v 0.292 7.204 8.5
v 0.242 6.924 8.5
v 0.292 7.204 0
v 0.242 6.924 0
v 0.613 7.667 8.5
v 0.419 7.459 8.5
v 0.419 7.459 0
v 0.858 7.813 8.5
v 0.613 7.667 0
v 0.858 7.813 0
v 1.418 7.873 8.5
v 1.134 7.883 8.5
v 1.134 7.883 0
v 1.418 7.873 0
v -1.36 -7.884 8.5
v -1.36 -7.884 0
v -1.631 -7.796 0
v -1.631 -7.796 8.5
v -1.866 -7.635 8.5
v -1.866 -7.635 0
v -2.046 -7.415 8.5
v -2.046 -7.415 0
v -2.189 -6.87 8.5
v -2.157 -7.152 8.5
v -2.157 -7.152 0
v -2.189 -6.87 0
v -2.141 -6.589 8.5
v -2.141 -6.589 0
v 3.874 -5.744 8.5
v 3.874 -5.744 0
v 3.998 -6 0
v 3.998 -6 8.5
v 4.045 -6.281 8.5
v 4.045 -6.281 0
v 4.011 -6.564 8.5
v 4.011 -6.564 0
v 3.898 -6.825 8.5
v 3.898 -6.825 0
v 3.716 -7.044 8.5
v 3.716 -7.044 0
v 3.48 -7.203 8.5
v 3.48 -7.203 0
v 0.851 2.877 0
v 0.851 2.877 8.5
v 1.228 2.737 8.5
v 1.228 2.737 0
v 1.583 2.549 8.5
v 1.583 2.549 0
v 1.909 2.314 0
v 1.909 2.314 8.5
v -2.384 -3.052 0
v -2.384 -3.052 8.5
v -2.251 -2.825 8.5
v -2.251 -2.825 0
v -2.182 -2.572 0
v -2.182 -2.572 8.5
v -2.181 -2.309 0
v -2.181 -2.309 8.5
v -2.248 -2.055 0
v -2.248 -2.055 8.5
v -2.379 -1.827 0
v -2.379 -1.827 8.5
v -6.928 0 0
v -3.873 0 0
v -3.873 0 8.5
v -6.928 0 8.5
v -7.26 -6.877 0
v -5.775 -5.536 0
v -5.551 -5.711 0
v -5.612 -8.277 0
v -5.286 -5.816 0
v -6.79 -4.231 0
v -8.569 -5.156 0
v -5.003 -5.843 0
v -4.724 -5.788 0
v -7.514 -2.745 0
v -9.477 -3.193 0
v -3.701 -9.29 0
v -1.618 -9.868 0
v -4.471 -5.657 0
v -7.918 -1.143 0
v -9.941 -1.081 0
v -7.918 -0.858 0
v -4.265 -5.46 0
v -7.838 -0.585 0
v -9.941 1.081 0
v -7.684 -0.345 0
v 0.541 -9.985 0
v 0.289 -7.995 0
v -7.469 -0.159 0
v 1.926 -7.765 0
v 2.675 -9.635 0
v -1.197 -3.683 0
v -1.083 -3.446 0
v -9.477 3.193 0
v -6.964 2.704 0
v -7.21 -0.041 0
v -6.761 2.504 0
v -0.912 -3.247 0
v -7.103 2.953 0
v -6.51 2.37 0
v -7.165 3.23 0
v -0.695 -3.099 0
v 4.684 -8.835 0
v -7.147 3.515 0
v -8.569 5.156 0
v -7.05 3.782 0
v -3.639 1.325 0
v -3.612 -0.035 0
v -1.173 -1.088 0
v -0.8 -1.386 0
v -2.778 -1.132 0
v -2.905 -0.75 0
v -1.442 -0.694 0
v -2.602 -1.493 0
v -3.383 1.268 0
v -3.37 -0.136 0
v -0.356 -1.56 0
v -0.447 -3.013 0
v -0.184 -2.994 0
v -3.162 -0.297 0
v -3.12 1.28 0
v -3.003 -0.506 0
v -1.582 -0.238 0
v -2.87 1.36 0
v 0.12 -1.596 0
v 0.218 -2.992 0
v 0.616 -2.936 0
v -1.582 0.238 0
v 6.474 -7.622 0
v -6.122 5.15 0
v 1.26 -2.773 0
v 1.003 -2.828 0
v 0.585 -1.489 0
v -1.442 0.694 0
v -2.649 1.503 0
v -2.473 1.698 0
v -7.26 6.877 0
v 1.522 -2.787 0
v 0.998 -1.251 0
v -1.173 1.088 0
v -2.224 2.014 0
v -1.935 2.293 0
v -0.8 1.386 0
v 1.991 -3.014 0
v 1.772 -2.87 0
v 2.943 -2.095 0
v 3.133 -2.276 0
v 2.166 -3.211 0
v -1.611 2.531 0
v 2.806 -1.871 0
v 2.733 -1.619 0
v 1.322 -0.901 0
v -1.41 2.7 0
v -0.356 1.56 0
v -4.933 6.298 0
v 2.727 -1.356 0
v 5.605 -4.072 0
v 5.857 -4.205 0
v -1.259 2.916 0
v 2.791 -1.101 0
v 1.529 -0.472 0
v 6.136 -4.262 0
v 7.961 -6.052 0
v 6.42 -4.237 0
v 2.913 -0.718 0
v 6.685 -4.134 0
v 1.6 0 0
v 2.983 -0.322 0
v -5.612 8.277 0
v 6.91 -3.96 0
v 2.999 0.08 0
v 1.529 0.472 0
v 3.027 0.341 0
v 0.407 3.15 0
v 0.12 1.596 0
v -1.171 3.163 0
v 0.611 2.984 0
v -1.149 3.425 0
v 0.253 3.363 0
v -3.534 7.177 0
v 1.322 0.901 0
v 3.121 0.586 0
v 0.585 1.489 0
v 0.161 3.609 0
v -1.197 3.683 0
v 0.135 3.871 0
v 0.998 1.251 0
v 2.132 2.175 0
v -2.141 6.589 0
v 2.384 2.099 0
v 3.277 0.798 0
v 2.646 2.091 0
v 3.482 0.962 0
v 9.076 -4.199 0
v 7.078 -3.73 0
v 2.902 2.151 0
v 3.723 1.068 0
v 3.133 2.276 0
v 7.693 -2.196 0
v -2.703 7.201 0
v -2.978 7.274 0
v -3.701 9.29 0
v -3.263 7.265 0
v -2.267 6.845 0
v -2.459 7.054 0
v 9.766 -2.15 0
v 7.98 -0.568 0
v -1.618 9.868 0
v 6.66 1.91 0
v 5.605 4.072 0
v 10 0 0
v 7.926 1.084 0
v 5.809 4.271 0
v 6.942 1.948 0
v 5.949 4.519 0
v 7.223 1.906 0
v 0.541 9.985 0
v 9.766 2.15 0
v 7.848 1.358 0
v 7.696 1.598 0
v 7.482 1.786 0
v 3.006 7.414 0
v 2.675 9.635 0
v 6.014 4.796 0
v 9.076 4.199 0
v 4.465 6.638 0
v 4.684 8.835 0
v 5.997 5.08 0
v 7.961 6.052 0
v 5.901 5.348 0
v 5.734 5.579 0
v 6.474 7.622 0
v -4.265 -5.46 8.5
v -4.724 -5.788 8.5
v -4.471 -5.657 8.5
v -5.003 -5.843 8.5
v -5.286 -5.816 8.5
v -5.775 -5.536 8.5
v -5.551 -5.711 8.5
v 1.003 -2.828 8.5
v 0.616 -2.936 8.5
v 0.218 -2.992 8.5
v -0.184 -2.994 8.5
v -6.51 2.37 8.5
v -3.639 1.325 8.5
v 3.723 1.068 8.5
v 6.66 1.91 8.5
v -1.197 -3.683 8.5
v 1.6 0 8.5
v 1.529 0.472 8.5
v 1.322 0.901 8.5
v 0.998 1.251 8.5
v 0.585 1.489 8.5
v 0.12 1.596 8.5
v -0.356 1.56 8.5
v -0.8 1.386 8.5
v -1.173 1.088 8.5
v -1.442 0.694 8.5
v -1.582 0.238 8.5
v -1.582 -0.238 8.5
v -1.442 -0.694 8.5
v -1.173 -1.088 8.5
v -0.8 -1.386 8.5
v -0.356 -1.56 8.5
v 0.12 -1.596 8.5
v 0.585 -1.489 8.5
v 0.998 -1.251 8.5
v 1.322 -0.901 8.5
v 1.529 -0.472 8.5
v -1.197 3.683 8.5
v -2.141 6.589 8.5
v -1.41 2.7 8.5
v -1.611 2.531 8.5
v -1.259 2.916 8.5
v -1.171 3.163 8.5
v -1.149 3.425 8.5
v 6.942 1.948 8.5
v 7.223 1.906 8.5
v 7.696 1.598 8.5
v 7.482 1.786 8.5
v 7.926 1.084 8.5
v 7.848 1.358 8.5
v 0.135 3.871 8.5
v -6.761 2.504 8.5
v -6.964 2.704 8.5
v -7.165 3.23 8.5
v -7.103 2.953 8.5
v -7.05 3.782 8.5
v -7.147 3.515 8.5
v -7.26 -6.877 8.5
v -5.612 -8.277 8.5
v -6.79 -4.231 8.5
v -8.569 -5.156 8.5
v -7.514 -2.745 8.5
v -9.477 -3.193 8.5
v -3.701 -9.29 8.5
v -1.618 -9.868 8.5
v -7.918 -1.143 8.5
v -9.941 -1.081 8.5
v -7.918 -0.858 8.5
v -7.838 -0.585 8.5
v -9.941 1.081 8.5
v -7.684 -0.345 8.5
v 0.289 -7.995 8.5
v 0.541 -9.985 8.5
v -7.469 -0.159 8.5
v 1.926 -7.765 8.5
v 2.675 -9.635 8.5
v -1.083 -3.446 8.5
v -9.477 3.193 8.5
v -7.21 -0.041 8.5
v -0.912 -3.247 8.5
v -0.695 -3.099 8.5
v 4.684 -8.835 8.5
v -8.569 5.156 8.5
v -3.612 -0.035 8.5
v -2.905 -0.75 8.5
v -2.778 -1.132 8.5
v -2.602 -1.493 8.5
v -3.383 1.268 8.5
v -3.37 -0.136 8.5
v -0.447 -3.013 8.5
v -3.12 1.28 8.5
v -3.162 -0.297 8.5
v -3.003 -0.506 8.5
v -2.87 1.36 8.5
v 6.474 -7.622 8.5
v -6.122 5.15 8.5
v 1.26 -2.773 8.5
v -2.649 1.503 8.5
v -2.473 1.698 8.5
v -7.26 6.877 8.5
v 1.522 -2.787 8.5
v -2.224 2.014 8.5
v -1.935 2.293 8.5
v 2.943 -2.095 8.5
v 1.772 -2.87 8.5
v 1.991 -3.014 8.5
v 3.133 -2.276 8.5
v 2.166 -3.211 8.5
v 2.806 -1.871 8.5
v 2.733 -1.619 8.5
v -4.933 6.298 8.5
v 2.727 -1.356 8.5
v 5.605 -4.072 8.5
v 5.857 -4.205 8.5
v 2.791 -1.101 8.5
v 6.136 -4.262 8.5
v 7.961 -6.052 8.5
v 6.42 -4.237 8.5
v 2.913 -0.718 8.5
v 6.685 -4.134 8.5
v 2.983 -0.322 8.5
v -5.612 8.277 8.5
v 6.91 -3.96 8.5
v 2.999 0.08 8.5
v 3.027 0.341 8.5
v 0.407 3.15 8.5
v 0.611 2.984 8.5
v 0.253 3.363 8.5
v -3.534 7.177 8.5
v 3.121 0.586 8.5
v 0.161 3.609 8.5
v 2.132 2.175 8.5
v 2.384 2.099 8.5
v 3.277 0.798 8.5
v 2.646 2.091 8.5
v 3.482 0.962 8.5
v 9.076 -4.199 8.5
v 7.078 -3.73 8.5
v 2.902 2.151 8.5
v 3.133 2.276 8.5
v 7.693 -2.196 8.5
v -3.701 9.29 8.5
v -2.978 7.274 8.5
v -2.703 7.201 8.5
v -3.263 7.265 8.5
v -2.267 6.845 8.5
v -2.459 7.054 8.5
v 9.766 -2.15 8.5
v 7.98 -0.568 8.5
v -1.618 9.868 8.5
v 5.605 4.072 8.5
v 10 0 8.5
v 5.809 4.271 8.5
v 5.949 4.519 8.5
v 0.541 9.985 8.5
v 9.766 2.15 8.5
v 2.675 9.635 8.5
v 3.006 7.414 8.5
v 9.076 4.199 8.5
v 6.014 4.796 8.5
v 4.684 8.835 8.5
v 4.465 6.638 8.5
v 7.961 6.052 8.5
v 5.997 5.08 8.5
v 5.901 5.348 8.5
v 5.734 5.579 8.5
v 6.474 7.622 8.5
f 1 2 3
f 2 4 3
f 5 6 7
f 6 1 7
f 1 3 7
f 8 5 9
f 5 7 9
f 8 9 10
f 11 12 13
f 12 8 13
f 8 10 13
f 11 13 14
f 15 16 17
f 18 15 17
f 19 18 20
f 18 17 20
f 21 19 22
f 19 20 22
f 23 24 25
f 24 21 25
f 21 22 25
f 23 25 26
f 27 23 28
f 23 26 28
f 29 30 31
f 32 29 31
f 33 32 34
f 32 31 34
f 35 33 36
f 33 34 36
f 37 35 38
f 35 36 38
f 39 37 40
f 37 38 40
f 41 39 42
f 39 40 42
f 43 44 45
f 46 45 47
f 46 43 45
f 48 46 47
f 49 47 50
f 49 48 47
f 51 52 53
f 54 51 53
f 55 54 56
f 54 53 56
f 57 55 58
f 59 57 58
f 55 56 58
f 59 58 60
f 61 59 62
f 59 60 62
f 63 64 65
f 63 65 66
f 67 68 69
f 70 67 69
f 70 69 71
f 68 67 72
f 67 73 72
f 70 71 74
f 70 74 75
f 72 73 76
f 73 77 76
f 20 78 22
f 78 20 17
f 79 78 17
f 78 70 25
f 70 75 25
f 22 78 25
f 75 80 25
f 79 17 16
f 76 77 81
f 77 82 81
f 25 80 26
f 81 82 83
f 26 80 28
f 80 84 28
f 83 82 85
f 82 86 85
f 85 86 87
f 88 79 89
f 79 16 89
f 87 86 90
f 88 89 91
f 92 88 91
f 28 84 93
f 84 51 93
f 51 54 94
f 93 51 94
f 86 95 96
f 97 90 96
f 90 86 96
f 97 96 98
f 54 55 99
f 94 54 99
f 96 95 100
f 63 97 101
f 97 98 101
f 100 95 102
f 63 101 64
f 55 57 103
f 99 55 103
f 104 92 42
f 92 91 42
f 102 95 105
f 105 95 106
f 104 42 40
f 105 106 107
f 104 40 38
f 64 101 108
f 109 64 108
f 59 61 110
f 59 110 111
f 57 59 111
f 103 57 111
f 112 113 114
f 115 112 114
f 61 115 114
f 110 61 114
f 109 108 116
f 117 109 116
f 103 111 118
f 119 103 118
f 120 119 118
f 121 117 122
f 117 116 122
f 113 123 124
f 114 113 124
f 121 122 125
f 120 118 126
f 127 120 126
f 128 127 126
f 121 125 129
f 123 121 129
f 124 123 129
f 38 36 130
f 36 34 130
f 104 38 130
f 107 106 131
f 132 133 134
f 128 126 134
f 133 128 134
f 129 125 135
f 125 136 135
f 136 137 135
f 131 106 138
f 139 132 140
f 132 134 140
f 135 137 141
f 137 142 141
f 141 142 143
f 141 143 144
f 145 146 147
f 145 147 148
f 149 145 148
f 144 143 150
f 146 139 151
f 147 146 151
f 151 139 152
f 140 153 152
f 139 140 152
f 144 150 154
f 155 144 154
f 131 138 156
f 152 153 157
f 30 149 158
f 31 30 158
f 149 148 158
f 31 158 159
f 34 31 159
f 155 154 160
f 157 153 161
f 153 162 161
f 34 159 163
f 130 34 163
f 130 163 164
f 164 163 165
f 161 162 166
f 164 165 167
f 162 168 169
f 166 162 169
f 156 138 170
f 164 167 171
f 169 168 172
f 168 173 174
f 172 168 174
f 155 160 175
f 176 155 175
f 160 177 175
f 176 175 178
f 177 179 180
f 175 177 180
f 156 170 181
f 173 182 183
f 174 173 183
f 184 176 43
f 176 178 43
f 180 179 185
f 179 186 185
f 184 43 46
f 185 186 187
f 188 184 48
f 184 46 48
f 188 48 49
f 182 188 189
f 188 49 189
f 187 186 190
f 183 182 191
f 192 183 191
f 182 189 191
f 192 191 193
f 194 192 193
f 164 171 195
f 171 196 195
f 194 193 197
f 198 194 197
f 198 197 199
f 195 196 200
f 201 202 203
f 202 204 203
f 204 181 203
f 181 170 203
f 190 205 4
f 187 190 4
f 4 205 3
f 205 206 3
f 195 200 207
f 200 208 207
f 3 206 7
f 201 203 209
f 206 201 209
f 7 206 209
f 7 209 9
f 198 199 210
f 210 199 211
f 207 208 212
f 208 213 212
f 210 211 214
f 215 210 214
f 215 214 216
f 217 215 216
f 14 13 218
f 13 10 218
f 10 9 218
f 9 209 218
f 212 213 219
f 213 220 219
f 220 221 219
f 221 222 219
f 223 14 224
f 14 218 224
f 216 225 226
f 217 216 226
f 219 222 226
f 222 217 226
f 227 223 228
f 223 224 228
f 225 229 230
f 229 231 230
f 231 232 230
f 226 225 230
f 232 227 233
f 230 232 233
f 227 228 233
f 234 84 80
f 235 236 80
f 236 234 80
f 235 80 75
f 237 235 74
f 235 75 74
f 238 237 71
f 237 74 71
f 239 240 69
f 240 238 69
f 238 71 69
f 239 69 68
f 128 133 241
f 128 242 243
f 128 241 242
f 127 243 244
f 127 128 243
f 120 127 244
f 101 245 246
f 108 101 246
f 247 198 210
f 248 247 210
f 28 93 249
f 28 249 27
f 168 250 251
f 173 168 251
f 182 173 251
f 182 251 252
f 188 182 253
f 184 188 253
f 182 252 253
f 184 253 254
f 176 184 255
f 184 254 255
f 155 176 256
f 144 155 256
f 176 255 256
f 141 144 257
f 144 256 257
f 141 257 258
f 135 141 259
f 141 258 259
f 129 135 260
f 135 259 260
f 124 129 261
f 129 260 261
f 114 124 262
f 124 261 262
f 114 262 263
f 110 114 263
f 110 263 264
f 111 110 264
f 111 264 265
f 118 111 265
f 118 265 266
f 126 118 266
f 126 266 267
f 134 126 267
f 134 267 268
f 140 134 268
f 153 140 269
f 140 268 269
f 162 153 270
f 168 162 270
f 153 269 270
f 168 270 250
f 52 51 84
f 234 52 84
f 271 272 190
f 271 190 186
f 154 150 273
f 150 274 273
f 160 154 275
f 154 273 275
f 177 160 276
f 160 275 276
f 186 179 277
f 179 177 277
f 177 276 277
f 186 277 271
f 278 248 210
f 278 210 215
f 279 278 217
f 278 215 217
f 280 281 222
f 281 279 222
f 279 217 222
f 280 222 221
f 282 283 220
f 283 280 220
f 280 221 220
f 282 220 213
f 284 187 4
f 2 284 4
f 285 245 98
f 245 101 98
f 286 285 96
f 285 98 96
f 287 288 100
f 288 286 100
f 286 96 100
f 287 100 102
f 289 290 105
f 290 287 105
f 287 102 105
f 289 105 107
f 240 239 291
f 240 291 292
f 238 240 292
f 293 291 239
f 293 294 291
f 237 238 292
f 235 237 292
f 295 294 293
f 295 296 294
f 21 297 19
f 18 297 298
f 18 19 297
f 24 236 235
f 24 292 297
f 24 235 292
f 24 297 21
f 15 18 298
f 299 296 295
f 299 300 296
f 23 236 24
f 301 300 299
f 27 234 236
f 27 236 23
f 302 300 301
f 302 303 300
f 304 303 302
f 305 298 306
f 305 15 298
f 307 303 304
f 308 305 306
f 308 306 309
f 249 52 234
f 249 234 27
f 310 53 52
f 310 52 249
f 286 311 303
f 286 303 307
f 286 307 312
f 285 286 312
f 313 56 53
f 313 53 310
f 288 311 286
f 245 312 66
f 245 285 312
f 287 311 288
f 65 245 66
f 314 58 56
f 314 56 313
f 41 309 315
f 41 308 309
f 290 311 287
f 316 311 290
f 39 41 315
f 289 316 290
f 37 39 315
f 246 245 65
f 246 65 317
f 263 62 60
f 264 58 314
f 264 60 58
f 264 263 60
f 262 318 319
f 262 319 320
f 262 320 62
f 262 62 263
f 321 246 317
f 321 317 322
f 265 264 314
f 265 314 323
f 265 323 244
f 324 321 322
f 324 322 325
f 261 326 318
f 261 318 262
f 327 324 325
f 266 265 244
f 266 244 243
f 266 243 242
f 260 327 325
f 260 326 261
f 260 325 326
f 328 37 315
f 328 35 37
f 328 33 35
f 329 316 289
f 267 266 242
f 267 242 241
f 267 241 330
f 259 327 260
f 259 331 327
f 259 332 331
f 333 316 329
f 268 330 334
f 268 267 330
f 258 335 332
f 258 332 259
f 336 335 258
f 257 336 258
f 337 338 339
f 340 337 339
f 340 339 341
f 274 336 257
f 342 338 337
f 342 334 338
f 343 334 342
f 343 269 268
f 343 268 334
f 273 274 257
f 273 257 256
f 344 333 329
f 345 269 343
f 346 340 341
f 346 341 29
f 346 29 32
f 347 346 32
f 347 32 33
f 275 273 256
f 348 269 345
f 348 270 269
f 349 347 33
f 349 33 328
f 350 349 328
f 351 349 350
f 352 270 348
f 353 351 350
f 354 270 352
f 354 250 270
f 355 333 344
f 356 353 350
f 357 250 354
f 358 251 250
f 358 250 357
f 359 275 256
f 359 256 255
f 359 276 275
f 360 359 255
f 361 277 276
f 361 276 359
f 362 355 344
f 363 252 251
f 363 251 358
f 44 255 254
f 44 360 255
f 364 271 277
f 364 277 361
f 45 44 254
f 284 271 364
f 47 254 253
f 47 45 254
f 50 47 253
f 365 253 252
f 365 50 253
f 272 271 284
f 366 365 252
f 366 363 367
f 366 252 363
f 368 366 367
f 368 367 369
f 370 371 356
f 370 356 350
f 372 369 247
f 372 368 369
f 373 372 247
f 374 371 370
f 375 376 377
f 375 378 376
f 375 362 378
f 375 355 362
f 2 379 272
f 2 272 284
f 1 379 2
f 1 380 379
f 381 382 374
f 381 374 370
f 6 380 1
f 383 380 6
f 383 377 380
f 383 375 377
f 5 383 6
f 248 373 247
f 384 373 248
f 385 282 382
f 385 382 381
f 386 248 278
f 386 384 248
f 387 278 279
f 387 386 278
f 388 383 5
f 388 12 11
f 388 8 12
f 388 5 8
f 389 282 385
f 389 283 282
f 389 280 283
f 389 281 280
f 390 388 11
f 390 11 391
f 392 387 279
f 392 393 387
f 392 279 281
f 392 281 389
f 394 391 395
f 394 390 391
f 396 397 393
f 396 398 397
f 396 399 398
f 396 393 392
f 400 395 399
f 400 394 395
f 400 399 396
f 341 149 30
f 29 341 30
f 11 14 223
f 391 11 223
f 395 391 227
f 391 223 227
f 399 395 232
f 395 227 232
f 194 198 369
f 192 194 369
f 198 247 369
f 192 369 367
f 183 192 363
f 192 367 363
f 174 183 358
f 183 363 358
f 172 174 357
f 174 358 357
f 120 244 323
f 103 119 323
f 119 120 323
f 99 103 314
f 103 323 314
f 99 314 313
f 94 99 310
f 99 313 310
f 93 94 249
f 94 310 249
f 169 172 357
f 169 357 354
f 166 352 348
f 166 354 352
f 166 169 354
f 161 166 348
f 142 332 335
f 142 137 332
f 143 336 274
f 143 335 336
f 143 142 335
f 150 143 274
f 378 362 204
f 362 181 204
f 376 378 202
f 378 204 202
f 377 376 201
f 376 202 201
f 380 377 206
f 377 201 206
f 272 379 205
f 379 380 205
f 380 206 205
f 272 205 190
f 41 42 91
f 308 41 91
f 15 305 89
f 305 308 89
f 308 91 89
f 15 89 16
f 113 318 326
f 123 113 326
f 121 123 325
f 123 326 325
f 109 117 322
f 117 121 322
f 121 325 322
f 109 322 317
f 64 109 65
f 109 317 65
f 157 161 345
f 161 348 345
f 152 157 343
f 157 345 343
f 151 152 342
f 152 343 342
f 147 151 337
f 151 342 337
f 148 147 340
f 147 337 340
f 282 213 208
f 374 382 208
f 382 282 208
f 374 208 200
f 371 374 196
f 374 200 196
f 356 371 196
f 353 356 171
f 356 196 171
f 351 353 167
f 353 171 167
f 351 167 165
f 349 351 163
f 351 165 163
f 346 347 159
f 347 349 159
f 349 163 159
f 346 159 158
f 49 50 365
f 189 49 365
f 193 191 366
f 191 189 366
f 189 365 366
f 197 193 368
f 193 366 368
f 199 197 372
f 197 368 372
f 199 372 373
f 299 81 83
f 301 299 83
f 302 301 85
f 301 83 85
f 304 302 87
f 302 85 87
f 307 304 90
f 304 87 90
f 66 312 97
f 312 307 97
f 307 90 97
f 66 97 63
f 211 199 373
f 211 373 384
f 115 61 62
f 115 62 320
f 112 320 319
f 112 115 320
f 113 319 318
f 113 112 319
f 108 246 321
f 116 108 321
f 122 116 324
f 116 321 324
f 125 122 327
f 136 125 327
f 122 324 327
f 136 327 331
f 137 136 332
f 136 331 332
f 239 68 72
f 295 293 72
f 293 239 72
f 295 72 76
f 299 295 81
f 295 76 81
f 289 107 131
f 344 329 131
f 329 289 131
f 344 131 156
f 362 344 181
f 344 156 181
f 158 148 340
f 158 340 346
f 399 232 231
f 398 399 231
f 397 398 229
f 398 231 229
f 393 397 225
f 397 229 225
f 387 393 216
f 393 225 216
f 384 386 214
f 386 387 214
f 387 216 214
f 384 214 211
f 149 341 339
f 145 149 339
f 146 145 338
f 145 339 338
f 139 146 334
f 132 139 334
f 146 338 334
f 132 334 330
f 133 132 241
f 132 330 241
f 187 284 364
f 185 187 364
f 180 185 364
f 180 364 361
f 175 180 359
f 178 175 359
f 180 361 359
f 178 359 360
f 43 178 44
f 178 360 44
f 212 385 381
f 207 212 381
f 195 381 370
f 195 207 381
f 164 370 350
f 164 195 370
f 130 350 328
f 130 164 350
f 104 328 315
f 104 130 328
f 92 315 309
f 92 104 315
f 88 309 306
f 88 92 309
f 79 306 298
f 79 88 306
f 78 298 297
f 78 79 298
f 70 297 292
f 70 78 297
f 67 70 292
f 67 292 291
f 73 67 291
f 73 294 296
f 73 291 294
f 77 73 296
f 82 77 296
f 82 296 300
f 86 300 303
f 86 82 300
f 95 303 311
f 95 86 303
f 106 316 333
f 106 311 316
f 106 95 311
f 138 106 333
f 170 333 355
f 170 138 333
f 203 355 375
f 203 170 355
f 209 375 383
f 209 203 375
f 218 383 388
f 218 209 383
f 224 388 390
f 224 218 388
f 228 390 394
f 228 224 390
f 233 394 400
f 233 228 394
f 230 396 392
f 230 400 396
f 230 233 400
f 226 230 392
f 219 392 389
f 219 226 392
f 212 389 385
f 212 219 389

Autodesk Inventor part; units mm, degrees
ref_plane "YZ Plane" through (0, 0, 0) normal (1, 0, 0) x (0, 1, 0)
ref_plane "XZ Plane" through (0, 0, 0) normal (0, 1, 0) x (-1, 0, 0)
ref_plane "XY Plane" through (0, 0, 0) normal (0, 0, 1) x (1, 0, 0)
sketch "Sketch4" plane through (0, 0, 0) normal (0, 0, 1) x (1, 0, 0)
  circle A0 centre (0, 0) radius 10
  arc A1 (-0.309, 0.9511) -> (-0.6428, 0.766) centre (0, 0) ccw
  line L0 (0, 0) -> (-0.309, 0.9511) construction
  line L1 (0, 0) -> (-0.9397, 0.342) construction
  arc A2 (0.5592, 0.829) -> (-0.309, 0.9511) centre (0, 0) ccw
  line L2 (-6.5104, 2.3696) -> (-2.8191, 1.0261)
  line L3 (-2.1409, 6.5891) -> (-0.9271, 2.8532)
  line L4 (-2.8191, 1.0261) -> (-6.5104, 2.3696)
  line L5 (-0.9271, 2.8532) -> (-2.1409, 6.5891)
  line L6 (-3, 0) -> (-6.9282, 0)
  arc A3 (-0.9397, 0.342) -> (-1, 0) centre (0, 0) ccw
  arc A4 (-0.309, 0.9511) -> (-0.9397, 0.342) centre (0, 0) ccw
  arc A5 (0.0349, 0.9994) -> (-0.309, 0.9511) centre (0, 0) ccw
  line L7 (0, 0) -> (0.0349, 0.9994) construction
  line L8 (0, 0) -> (-0.309, 0.9511) construction
  arc A6 (0.809, 0.5878) -> (0.0349, 0.9994) centre (0, 0) ccw
  line L9 (0, 0) -> (0.809, 0.5878) construction
  line L10 (0, 0) -> (0.0349, 0.9994) construction
  arc A7 (0.9613, 0.2756) -> (0.809, 0.5878) centre (0, 0) ccw
  line L11 (0, 0) -> (0.9613, 0.2756) construction
  line L12 (0, 0) -> (0.809, 0.5878) construction
  arc A8 (0.809, -0.5878) -> (0.9613, 0.2756) centre (0, 0) ccw
  line L13 (0, 0) -> (0.809, -0.5878) construction
  line L14 (0, 0) -> (0.9613, 0.2756) construction
  arc A9 (0.5592, -0.829) -> (0.809, -0.5878) centre (0, 0) ccw
  line L15 (0, 0) -> (0.5592, -0.829) construction
  line L16 (0, 0) -> (0.809, -0.5878) construction
  arc A10 (-0.309, -0.9511) -> (0.5592, -0.829) centre (0, 0) ccw
  line L17 (0, 0) -> (-0.309, -0.9511) construction
  line L18 (0, 0) -> (0.5592, -0.829) construction
  arc A11 (-0.6157, -0.788) -> (-0.309, -0.9511) centre (0, 0) ccw
  line L19 (0, 0) -> (-0.6157, -0.788) construction
  line L20 (0, 0) -> (-0.309, -0.9511) construction
  arc A12 (-1, 0) -> (-0.6157, -0.788) centre (0, 0) ccw
  line L21 (0.1047, 2.9982) -> (0.2418, 6.924) construction
  line L22 (-1.847, -2.364) -> (-4.2654, -5.4595) construction
  line L23 (-1.847, -2.364) -> (-4.2654, -5.4595)
  line L24 (-0.9271, -2.8532) -> (-2.1409, -6.5891)
  line L25 (1.6776, -2.4871) -> (3.8742, -5.7437)
  line L26 (2.4271, -1.7634) -> (5.605, -4.0723)
  line L27 (2.8838, 0.8269) -> (6.6598, 1.9097)
  line L28 (2.4271, 1.7634) -> (5.605, 4.0723)
  line L29 (0.1047, 2.9982) -> (0.2418, 6.924)
  arc A13 (-1.8794, 0.684) -> (-2, 0) centre (0, 0) ccw
  line L30 (0, 0) -> (0.809, 0.5878) construction
  line L31 (2.4271, 1.7634) -> (5.605, 4.0723) construction
  line L32 (0, 0) -> (-0.309, 0.9511) construction
  line L33 (-0.9271, 2.8532) -> (-2.3011, 7.0821) construction
  line L34 (0, 0) -> (0.0349, 0.9994) construction
  line L35 (0.1047, 2.9982) -> (0.2418, 6.924) construction
  line L36 (0, 0) -> (-0.309, 0.9511) construction
  line L37 (-0.9271, 2.8532) -> (-2.3011, 7.0821) construction
  line L38 (-1.6276, 0.5924) -> (-1.8794, 0.684) construction
  line L39 (-2.8191, 1.0261) -> (-6.9975, 2.5469) construction
  line L40 (0, 0) -> (-0.309, -0.9511) construction
  line L41 (-0.9271, -2.8532) -> (-2.1409, -6.5891) construction
  line L42 (0, 0) -> (0.5592, -0.829) construction
  line L43 (1.6776, -2.4871) -> (3.8742, -5.7437) construction
  line L44 (0, 0) -> (0.809, -0.5878) construction
  line L45 (2.4271, -1.7634) -> (6.0244, -4.377) construction
  line L46 (0, 0) -> (0.9613, 0.2756) construction
  line L47 (2.8838, 0.8269) -> (6.6598, 1.9097) construction
  line L48 (0, 0) -> (-0.309, -0.9511) construction
  line L49 (-0.9271, -2.8532) -> (-2.3011, -7.0821) construction
  line L50 (0, 0) -> (0.5592, -0.829) construction
  line L51 (1.5816, -2.3449) -> (3.8742, -5.7437) construction
  line L52 (0, 0) -> (0.9613, 0.2756) construction
  line L53 (2.8838, 0.8269) -> (7.1581, 2.0526) construction
  arc A14 (-1.3599, -7.8836) -> (3.4802, -7.2034) centre (0, 0) ccw
  arc A15 (-7.9179, -1.1429) -> (-5.7754, -5.5358) centre (0, 0) ccw
  arc A16 (-3.5337, 7.1773) -> (-7.0496, 3.782) centre (0, 0) ccw
  arc A17 (5.734, 5.5786) -> (1.4185, 7.8732) centre (0, 0) ccw
  arc A18 (7.0775, -3.7295) -> (7.9262, 1.0839) centre (0, 0) ccw
  arc A19 (5.605, -4.0723) -> (7.0775, -3.7295) centre (6.1928, -3.2633) ccw
  arc A20 (7.9262, 1.0839) -> (6.6598, 1.9097) centre (6.9355, 0.9484) ccw
  arc A21 (5.605, 4.0723) -> (5.734, 5.5786) centre (5.0172, 4.8813) ccw
  arc A22 (1.4185, 7.8732) -> (0.2418, 6.924) centre (1.2412, 6.8891) ccw
  arc A23 (-2.1409, 6.5891) -> (-3.5337, 7.1773) centre (-3.092, 6.2801) ccw
  arc A24 (-7.0496, 3.782) -> (-6.5104, 2.3696) centre (-6.1684, 3.3093) ccw
  arc A25 (-6.9282, 0) -> (-7.9179, -1.1429) centre (-6.9282, -1) ccw
  arc A26 (-5.7754, -5.5358) -> (-4.2654, -5.4595) centre (-5.0534, -4.8438) ccw
  arc A27 (-2.1409, -6.5891) -> (-1.3599, -7.8836) centre (-1.1899, -6.8981) ccw
  arc A28 (3.4802, -7.2034) -> (3.8742, -5.7437) centre (3.0452, -6.3029) ccw
  circle A29 centre (0, 0) radius 3
  line L54 (0, 0) -> (-0.309, 0.9511) construction
  line L55 (-0.9271, 2.8532) -> (-2.1409, 6.5891) construction
  line L56 (0, 0) -> (0.809, 0.5878) construction
  line L57 (2.4271, 1.7634) -> (5.605, 4.0723) construction
  line L58 (-0.809, 0.5878) -> (0.809, -0.5878) construction
  line L59 (2.4271, -1.7634) -> (5.605, -4.0723) construction
  point P0 (-4.5846, -5.868)
  point P1 (-1.7414, -2.2288)
  dimension "d123" = 6
  dimension "d33" = 20
  dimension "d42" = 52
  dimension "d50" = 20
  dimension "d51" = 52
  dimension "d52" = 20
  dimension "d53" = 52
  dimension "d54" = 20
  dimension "d55" = 52
  dimension "d56" = 20
  dimension "d65" = 2
  dimension "d77" = 8
  dimension "d78" = 1
extrude "Extrusion9" add sketch "Sketch4" along normal blind 8.5 contours A0 | A29
sketch "Engranaje41" plane through (0, 0, 0) normal (0, 0, -1) x (-1, 0, 0)
  circle A0 centre (0, 0) radius 1
  arc A1 (1.256, 9.9788) -> (1.0973, 10.6734) centre (-2.5912, 9.4651) ccw
  arc A2 (1.0973, 10.6734) -> (0.854, 10.6956) centre (0, 0) ccw
  arc A3 (0.854, 10.6956) -> (0.5721, 10.0412) centre (4.2626, 8.8392) ccw
  arc A4 (0.5721, 10.0412) -> (0.3434, 10.0517) centre (0, 0) ccw
  arc A5 (0.3434, 10.0517) -> (0.1221, 10.729) centre (-3.4411, 9.1902) ccw
  arc A6 (0.1221, 10.729) -> (-0.1221, 10.729) centre (0, 0) ccw
  arc A7 (-0.1221, 10.729) -> (-0.3434, 10.0517) centre (3.4411, 9.1902) ccw
  arc A8 (-0.3434, 10.0517) -> (-0.5721, 10.0412) centre (0, 0) ccw
  arc A9 (-0.5721, 10.0412) -> (-0.854, 10.6956) centre (-4.2626, 8.8392) ccw
  arc A10 (-0.854, 10.6956) -> (-1.0973, 10.6734) centre (0, 0) ccw
  arc A11 (-1.0973, 10.6734) -> (-1.256, 9.9788) centre (2.5912, 9.4651) ccw
  arc A12 (-1.256, 9.9788) -> (-1.4828, 9.9476) centre (0, 0) ccw
  arc A13 (-1.4828, 9.9476) -> (-1.8231, 10.5737) centre (-5.0487, 8.415) ccw
  arc A14 (-1.8231, 10.5737) -> (-2.0633, 10.5294) centre (0, 0) ccw
  arc A15 (-2.0633, 10.5294) -> (-2.1582, 9.8232) centre (1.7197, 9.6615) ccw
  arc A16 (-2.1582, 9.8232) -> (-2.3813, 9.7716) centre (0, 0) ccw
  arc A17 (-2.3813, 9.7716) -> (-2.777, 10.3641) centre (-5.793, 7.921) ccw
  arc A18 (-2.777, 10.3641) -> (-3.0122, 10.2982) centre (0, 0) ccw
  arc A19 (-3.0122, 10.2982) -> (-3.0425, 9.5863) centre (0.834, 9.7778) ccw
  arc A20 (-3.0425, 9.5863) -> (-3.26, 9.5145) centre (0, 0) ccw
  arc A21 (-3.26, 9.5145) -> (-3.708, 10.0686) centre (-6.4893, 7.3614) ccw
  arc A22 (-3.708, 10.0686) -> (-3.9362, 9.9816) centre (0, 0) ccw
  arc A23 (-3.9362, 9.9816) -> (-3.9017, 9.2699) centre (-0.0586, 9.8132) ccw
  arc A24 (-3.9017, 9.2699) -> (-4.1117, 9.1787) centre (0, 0) ccw
  arc A25 (-4.1117, 9.1787) -> (-4.6082, 9.6897) centre (-7.1318, 6.7408) ccw
  arc A26 (-4.6082, 9.6897) -> (-4.8276, 9.5823) centre (0, 0) ccw
  arc A27 (-4.8276, 9.5823) -> (-4.7285, 8.8767) centre (-0.9507, 9.7672) ccw
  arc A28 (-4.7285, 8.8767) -> (-4.9293, 8.7667) centre (0, 0) ccw
  arc A29 (-4.9293, 8.7667) -> (-5.4703, 9.2305) centre (-7.7153, 6.0644) ccw
  arc A30 (-5.4703, 9.2305) -> (-5.679, 9.1036) centre (0, 0) ccw
  arc A31 (-5.679, 9.1036) -> (-5.5161, 8.4099) centre (-1.8349, 9.6403) ccw
  arc A32 (-5.5161, 8.4099) -> (-5.7061, 8.2822) centre (0, 0) ccw
  arc A33 (-5.7061, 8.2822) -> (-6.287, 8.6948) centre (-8.2348, 5.3376) ccw
  arc A34 (-6.287, 8.6948) -> (-6.4833, 8.5495) centre (0, 0) ccw
  arc A35 (-6.4833, 8.5495) -> (-6.258, 7.8735) centre (-2.704, 9.4335) ccw
  arc A36 (-6.258, 7.8735) -> (-6.4356, 7.729) centre (0, 0) ccw
  arc A37 (-6.4356, 7.729) -> (-7.0516, 8.0871) centre (-8.686, 4.5667) ccw
  arc A38 (-7.0516, 8.0871) -> (-7.2338, 7.9245) centre (0, 0) ccw
  arc A39 (-7.2338, 7.9245) -> (-6.948, 7.2718) centre (-3.5506, 9.1485) ccw
  arc A40 (-6.948, 7.2718) -> (-7.1117, 7.1117) centre (0, 0) ccw
  arc A41 (-7.1117, 7.1117) -> (-7.7578, 7.4124) centre (-9.0653, 3.7579) ccw
  arc A42 (-7.7578, 7.4124) -> (-7.9245, 7.2338) centre (0, 0) ccw
  arc A43 (-7.9245, 7.2338) -> (-7.5805, 6.6098) centre (-4.3678, 8.7877) ccw
  arc A44 (-7.5805, 6.6098) -> (-7.729, 6.4356) centre (0, 0) ccw
  arc A45 (-7.729, 6.4356) -> (-8.3997, 6.6762) centre (-9.3695, 2.918) ccw
  arc A46 (-8.3997, 6.6762) -> (-8.5495, 6.4833) centre (0, 0) ccw
  arc A47 (-8.5495, 6.4833) -> (-8.1501, 5.8931) centre (-5.1488, 8.3541) ccw
  arc A48 (-8.1501, 5.8931) -> (-8.2822, 5.7061) centre (0, 0) ccw
  arc A49 (-8.2822, 5.7061) -> (-8.972, 5.8847) centre (-9.596, 2.0539) ccw
  arc A50 (-8.972, 5.8847) -> (-9.1036, 5.679) centre (0, 0) ccw
  arc A51 (-9.1036, 5.679) -> (-8.6523, 5.1276) centre (-5.8872, 7.8513) ccw
  arc A52 (-8.6523, 5.1276) -> (-8.7667, 4.9293) centre (0, 0) ccw
  arc A53 (-8.7667, 4.9293) -> (-9.4699, 5.0445) centre (-9.743, 1.1728) ccw
  arc A54 (-9.4699, 5.0445) -> (-9.5823, 4.8276) centre (0, 0) ccw
  arc A55 (-9.5823, 4.8276) -> (-9.0827, 4.3195) centre (-6.5767, 7.2834) ccw
  arc A56 (-9.0827, 4.3195) -> (-9.1787, 4.1117) centre (0, 0) ccw
  arc A57 (-9.1787, 4.1117) -> (-9.8894, 4.1624) centre (-9.8093, 0.2819) ccw
  arc A58 (-9.8894, 4.1624) -> (-9.9816, 3.9362) centre (0, 0) ccw
  arc A59 (-9.9816, 3.9362) -> (-9.4379, 3.4757) centre (-7.2118, 6.6552) ccw
  arc A60 (-9.4379, 3.4757) -> (-9.5145, 3.26) centre (0, 0) ccw
  arc A61 (-9.5145, 3.26) -> (-10.2269, 3.2459) centre (-9.7943, -0.6112) ccw
  arc A62 (-10.2269, 3.2459) -> (-10.2982, 3.0122) centre (0, 0) ccw
  arc A63 (-10.2982, 3.0122) -> (-9.7148, 2.6031) centre (-7.7871, 5.9718) ccw
  arc A64 (-9.7148, 2.6031) -> (-9.7716, 2.3813) centre (0, 0) ccw
  arc A65 (-9.7716, 2.3813) -> (-10.4797, 2.3024) centre (-9.6981, -1.4994) ccw
  arc A66 (-10.4797, 2.3024) -> (-10.5294, 2.0633) centre (0, 0) ccw
  arc A67 (-10.5294, 2.0633) -> (-9.9113, 1.7089) centre (-8.2979, 5.239) ccw
  arc A68 (-9.9113, 1.7089) -> (-9.9476, 1.4828) centre (0, 0) ccw
  arc A69 (-9.9476, 1.4828) -> (-10.6457, 1.3399) centre (-9.5216, -2.375) ccw
  arc A70 (-10.6457, 1.3399) -> (-10.6734, 1.0973) centre (0, 0) ccw
  arc A71 (-10.6734, 1.0973) -> (-10.0256, 0.8005) centre (-8.7399, 4.4627) ccw
  arc A72 (-10.0256, 0.8005) -> (-10.0412, 0.5721) centre (0, 0) ccw
  arc A73 (-10.0412, 0.5721) -> (-10.7234, 0.3663) centre (-9.2662, -3.231) ccw
  arc A74 (-10.7234, 0.3663) -> (-10.729, 0.1221) centre (0, 0) ccw
  arc A75 (-10.729, 0.1221) -> (-10.0569, -0.1145) centre (-9.1095, 3.6494) ccw
  arc A76 (-10.0569, -0.1145) -> (-10.0517, -0.3434) centre (0, 0) ccw
  arc A77 (-10.0517, -0.3434) -> (-10.7123, -0.6103) centre (-8.934, -4.0603) ccw
  arc A78 (-10.7123, -0.6103) -> (-10.6956, -0.854) centre (0, 0) ccw
  arc A79 (-10.6956, -0.854) -> (-10.0048, -1.0285) centre (-9.4036, 2.806) ccw
  arc A80 (-10.0048, -1.0285) -> (-9.9788, -1.256) centre (0, 0) ccw
  arc A81 (-9.9788, -1.256) -> (-10.6124, -1.5819) centre (-8.5277, -4.8559) ccw
  arc A82 (-10.6124, -1.5819) -> (-10.5737, -1.8231) centre (0, 0) ccw
  arc A83 (-10.5737, -1.8231) -> (-9.8698, -1.934) centre (-9.6198, 1.9392) ccw
  arc A84 (-9.8698, -1.934) -> (-9.8232, -2.1582) centre (0, 0) ccw
  arc A85 (-9.8232, -2.1582) -> (-10.4246, -2.5404) centre (-8.0508, -5.6112) ccw
  arc A86 (-10.4246, -2.5404) -> (-10.3641, -2.777) centre (0, 0) ccw
  arc A87 (-10.3641, -2.777) -> (-9.653, -2.8235) centre (-9.7563, 1.0564) ccw
  arc A88 (-9.653, -2.8235) -> (-9.5863, -3.0425) centre (0, 0) ccw
  arc A89 (-9.5863, -3.0425) -> (-10.1504, -3.4778) centre (-7.5072, -6.3201) ccw
  arc A90 (-10.1504, -3.4778) -> (-10.0686, -3.708) centre (0, 0) ccw
  arc A91 (-10.0686, -3.708) -> (-9.3563, -3.6896) centre (-9.812, 0.1648) ccw
  arc A92 (-9.3563, -3.6896) -> (-9.2699, -3.9017) centre (0, 0) ccw
  arc A93 (-9.2699, -3.9017) -> (-9.7921, -4.3865) centre (-6.9014, -6.9766) ccw
  arc A94 (-9.7921, -4.3865) -> (-9.6897, -4.6082) centre (0, 0) ccw
  arc A95 (-9.6897, -4.6082) -> (-8.982, -4.5252) centre (-9.7863, -0.7281) ccw
  arc A96 (-8.982, -4.5252) -> (-8.8767, -4.7285) centre (0, 0) ccw
  arc A97 (-8.8767, -4.7285) -> (-9.3526, -5.2587) centre (-6.2384, -7.5752) ccw
  arc A98 (-9.3526, -5.2587) -> (-9.2305, -5.4703) centre (0, 0) ccw
  arc A99 (-9.2305, -5.4703) -> (-8.5333, -5.3232) centre (-9.6795, -1.615) ccw
  arc A100 (-8.5333, -5.3232) -> (-8.4099, -5.5161) centre (0, 0) ccw
  arc A101 (-8.4099, -5.5161) -> (-8.8357, -6.0874) centre (-5.5237, -8.1111) ccw
  arc A102 (-8.8357, -6.0874) -> (-8.6948, -6.287) centre (0, 0) ccw
  arc A103 (-8.6948, -6.287) -> (-8.0139, -6.0771) centre (-9.4926, -2.4885) ccw
  arc A104 (-8.0139, -6.0771) -> (-7.8735, -6.258) centre (0, 0) ccw
  arc A105 (-7.8735, -6.258) -> (-8.2455, -6.8657) centre (-4.7632, -8.5798) ccw
  arc A106 (-8.2455, -6.8657) -> (-8.0871, -7.0516) centre (0, 0) ccw
  arc A107 (-8.0871, -7.0516) -> (-7.4281, -6.7807) centre (-9.227, -3.3414) ccw
  arc A108 (-7.4281, -6.7807) -> (-7.2718, -6.948) centre (0, 0) ccw
  arc A109 (-7.2718, -6.948) -> (-7.587, -7.587) centre (-3.9633, -8.9774) ccw
  arc A110 (-7.587, -7.587) -> (-7.4124, -7.7578) centre (0, 0) ccw
  arc A111 (-7.4124, -7.7578) -> (-6.7807, -7.4281) centre (-8.8849, -4.1666) ccw
  arc A112 (-6.7807, -7.4281) -> (-6.6098, -7.5805) centre (0, 0) ccw
  arc A113 (-6.6098, -7.5805) -> (-6.8657, -8.2455) centre (-3.1305, -9.3006) ccw
  arc A114 (-6.8657, -8.2455) -> (-6.6762, -8.3997) centre (0, 0) ccw
  arc A115 (-6.6762, -8.3997) -> (-6.0771, -8.0139) centre (-8.4692, -4.9573) ccw
  arc A116 (-6.0771, -8.0139) -> (-5.8931, -8.1501) centre (0, 0) ccw
  arc A117 (-5.8931, -8.1501) -> (-6.0874, -8.8357) centre (-2.2718, -9.5468) ccw
  arc A118 (-6.0874, -8.8357) -> (-5.8847, -8.972) centre (0, 0) ccw
  arc A119 (-5.8847, -8.972) -> (-5.3232, -8.5333) centre (-7.9833, -5.7069) ccw
  arc A120 (-5.3232, -8.5333) -> (-5.1276, -8.6523) centre (0, 0) ccw
  arc A121 (-5.1276, -8.6523) -> (-5.2587, -9.3526) centre (-1.3942, -9.7138) ccw
  arc A122 (-5.2587, -9.3526) -> (-5.0445, -9.4699) centre (0, 0) ccw
  arc A123 (-5.0445, -9.4699) -> (-4.5252, -8.982) centre (-7.4313, -6.4092) ccw
  arc A124 (-4.5252, -8.982) -> (-4.3195, -9.0827) centre (0, 0) ccw
  arc A125 (-4.3195, -9.0827) -> (-4.3865, -9.7921) centre (-0.5051, -9.8003) ccw
  arc A126 (-4.3865, -9.7921) -> (-4.1624, -9.8894) centre (0, 0) ccw
  arc A127 (-4.1624, -9.8894) -> (-3.6896, -9.3563) centre (-6.8177, -7.0584) ccw
  arc A128 (-3.6896, -9.3563) -> (-3.4757, -9.4379) centre (0, 0) ccw
  arc A129 (-3.4757, -9.4379) -> (-3.4778, -10.1504) centre (0.3881, -9.8057) ccw
  arc A130 (-3.4778, -10.1504) -> (-3.2459, -10.2269) centre (0, 0) ccw
  arc A131 (-3.2459, -10.2269) -> (-2.8235, -9.653) centre (-6.1475, -7.6492) ccw
  arc A132 (-2.8235, -9.653) -> (-2.6031, -9.7148) centre (0, 0) ccw
  arc A133 (-2.6031, -9.7148) -> (-2.5404, -10.4246) centre (1.2782, -9.7298) ccw
  arc A134 (-2.5404, -10.4246) -> (-2.3024, -10.4797) centre (0, 0) ccw
  arc A135 (-2.3024, -10.4797) -> (-1.934, -9.8698) centre (-5.4265, -8.1765) ccw
  arc A136 (-1.934, -9.8698) -> (-1.7089, -9.9113) centre (0, 0) ccw
  arc A137 (-1.7089, -9.9113) -> (-1.5819, -10.6124) centre (2.1577, -9.5732) ccw
  arc A138 (-1.5819, -10.6124) -> (-1.3399, -10.6457) centre (0, 0) ccw
  arc A139 (-1.3399, -10.6457) -> (-1.0285, -10.0048) centre (-4.6605, -8.6361) ccw
  arc A140 (-1.0285, -10.0048) -> (-0.8005, -10.0256) centre (0, 0) ccw
  arc A141 (-0.8005, -10.0256) -> (-0.6103, -10.7123) centre (3.0193, -9.3373) ccw
  arc A142 (-0.6103, -10.7123) -> (-0.3663, -10.7234) centre (0, 0) ccw
  arc A143 (-0.3663, -10.7234) -> (-0.1145, -10.0569) centre (-3.8559, -9.0241) ccw
  arc A144 (-0.1145, -10.0569) -> (0.1145, -10.0569) centre (0, 0) ccw
  arc A145 (0.1145, -10.0569) -> (0.3663, -10.7234) centre (3.8559, -9.0241) ccw
  arc A146 (0.3663, -10.7234) -> (0.6103, -10.7123) centre (0, 0) ccw
  arc A147 (0.6103, -10.7123) -> (0.8005, -10.0256) centre (-3.0193, -9.3373) ccw
  arc A148 (0.8005, -10.0256) -> (1.0285, -10.0048) centre (0, 0) ccw
  arc A149 (1.0285, -10.0048) -> (1.3399, -10.6457) centre (4.6605, -8.6361) ccw
  arc A150 (1.3399, -10.6457) -> (1.5819, -10.6124) centre (0, 0) ccw
  arc A151 (1.5819, -10.6124) -> (1.7089, -9.9113) centre (-2.1577, -9.5732) ccw
  arc A152 (1.7089, -9.9113) -> (1.934, -9.8698) centre (0, 0) ccw
  arc A153 (1.934, -9.8698) -> (2.3024, -10.4797) centre (5.4265, -8.1765) ccw
  arc A154 (2.3024, -10.4797) -> (2.5404, -10.4246) centre (0, 0) ccw
  arc A155 (2.5404, -10.4246) -> (2.6031, -9.7148) centre (-1.2782, -9.7298) ccw
  arc A156 (2.6031, -9.7148) -> (2.8235, -9.653) centre (0, 0) ccw
  arc A157 (2.8235, -9.653) -> (3.2459, -10.2269) centre (6.1475, -7.6492) ccw
  arc A158 (3.2459, -10.2269) -> (3.4778, -10.1504) centre (0, 0) ccw
  arc A159 (3.4778, -10.1504) -> (3.4757, -9.4379) centre (-0.3881, -9.8057) ccw
  arc A160 (3.4757, -9.4379) -> (3.6896, -9.3563) centre (0, 0) ccw
  arc A161 (3.6896, -9.3563) -> (4.1624, -9.8894) centre (6.8177, -7.0584) ccw
  arc A162 (4.1624, -9.8894) -> (4.3865, -9.7921) centre (0, 0) ccw
  arc A163 (4.3865, -9.7921) -> (4.3195, -9.0827) centre (0.5051, -9.8003) ccw
  arc A164 (4.3195, -9.0827) -> (4.5252, -8.982) centre (0, 0) ccw
  arc A165 (4.5252, -8.982) -> (5.0445, -9.4699) centre (7.4313, -6.4092) ccw
  arc A166 (5.0445, -9.4699) -> (5.2587, -9.3526) centre (0, 0) ccw
  arc A167 (5.2587, -9.3526) -> (5.1276, -8.6523) centre (1.3942, -9.7138) ccw
  arc A168 (5.1276, -8.6523) -> (5.3232, -8.5333) centre (0, 0) ccw
  arc A169 (5.3232, -8.5333) -> (5.8847, -8.972) centre (7.9833, -5.7069) ccw
  arc A170 (5.8847, -8.972) -> (6.0874, -8.8357) centre (0, 0) ccw
  arc A171 (6.0874, -8.8357) -> (5.8931, -8.1501) centre (2.2718, -9.5468) ccw
  arc A172 (5.8931, -8.1501) -> (6.0771, -8.0139) centre (0, 0) ccw
  arc A173 (6.0771, -8.0139) -> (6.6762, -8.3997) centre (8.4692, -4.9573) ccw
  arc A174 (6.6762, -8.3997) -> (6.8657, -8.2455) centre (0, 0) ccw
  arc A175 (6.8657, -8.2455) -> (6.6098, -7.5805) centre (3.1305, -9.3006) ccw
  arc A176 (6.6098, -7.5805) -> (6.7807, -7.4281) centre (0, 0) ccw
  arc A177 (6.7807, -7.4281) -> (7.4124, -7.7578) centre (8.8849, -4.1666) ccw
  arc A178 (7.4124, -7.7578) -> (7.587, -7.587) centre (0, 0) ccw
  arc A179 (7.587, -7.587) -> (7.2718, -6.948) centre (3.9633, -8.9774) ccw
  arc A180 (7.2718, -6.948) -> (7.4281, -6.7807) centre (0, 0) ccw
  arc A181 (7.4281, -6.7807) -> (8.0871, -7.0516) centre (9.227, -3.3414) ccw
  arc A182 (8.0871, -7.0516) -> (8.2455, -6.8657) centre (0, 0) ccw
  arc A183 (8.2455, -6.8657) -> (7.8735, -6.258) centre (4.7632, -8.5798) ccw
  arc A184 (7.8735, -6.258) -> (8.0139, -6.0771) centre (0, 0) ccw
  arc A185 (8.0139, -6.0771) -> (8.6948, -6.287) centre (9.4926, -2.4885) ccw
  arc A186 (8.6948, -6.287) -> (8.8357, -6.0874) centre (0, 0) ccw
  arc A187 (8.8357, -6.0874) -> (8.4099, -5.5161) centre (5.5237, -8.1111) ccw
  arc A188 (8.4099, -5.5161) -> (8.5333, -5.3232) centre (0, 0) ccw
  arc A189 (8.5333, -5.3232) -> (9.2305, -5.4703) centre (9.6795, -1.615) ccw
  arc A190 (9.2305, -5.4703) -> (9.3526, -5.2587) centre (0, 0) ccw
  arc A191 (9.3526, -5.2587) -> (8.8767, -4.7285) centre (6.2384, -7.5752) ccw
  arc A192 (8.8767, -4.7285) -> (8.982, -4.5252) centre (0, 0) ccw
  arc A193 (8.982, -4.5252) -> (9.6897, -4.6082) centre (9.7863, -0.7281) ccw
  arc A194 (9.6897, -4.6082) -> (9.7921, -4.3865) centre (0, 0) ccw
  arc A195 (9.7921, -4.3865) -> (9.2699, -3.9017) centre (6.9014, -6.9766) ccw
  arc A196 (9.2699, -3.9017) -> (9.3563, -3.6896) centre (0, 0) ccw
  arc A197 (9.3563, -3.6896) -> (10.0686, -3.708) centre (9.812, 0.1648) ccw
  arc A198 (10.0686, -3.708) -> (10.1504, -3.4778) centre (0, 0) ccw
  arc A199 (10.1504, -3.4778) -> (9.5863, -3.0425) centre (7.5072, -6.3201) ccw
  arc A200 (9.5863, -3.0425) -> (9.653, -2.8235) centre (0, 0) ccw
  arc A201 (9.653, -2.8235) -> (10.3641, -2.777) centre (9.7563, 1.0564) ccw
  arc A202 (10.3641, -2.777) -> (10.4246, -2.5404) centre (0, 0) ccw
  arc A203 (10.4246, -2.5404) -> (9.8232, -2.1582) centre (8.0508, -5.6112) ccw
  arc A204 (9.8232, -2.1582) -> (9.8698, -1.934) centre (0, 0) ccw
  arc A205 (9.8698, -1.934) -> (10.5737, -1.8231) centre (9.6198, 1.9392) ccw
  arc A206 (10.5737, -1.8231) -> (10.6124, -1.5819) centre (0, 0) ccw
  arc A207 (10.6124, -1.5819) -> (9.9788, -1.256) centre (8.5277, -4.8559) ccw
  arc A208 (9.9788, -1.256) -> (10.0048, -1.0285) centre (0, 0) ccw
  arc A209 (10.0048, -1.0285) -> (10.6956, -0.854) centre (9.4036, 2.806) ccw
  arc A210 (10.6956, -0.854) -> (10.7123, -0.6103) centre (0, 0) ccw
  arc A211 (10.7123, -0.6103) -> (10.0517, -0.3434) centre (8.934, -4.0603) ccw
  arc A212 (10.0517, -0.3434) -> (10.0569, -0.1145) centre (0, 0) ccw
  arc A213 (10.0569, -0.1145) -> (10.729, 0.1221) centre (9.1095, 3.6494) ccw
  arc A214 (10.729, 0.1221) -> (10.7234, 0.3663) centre (0, 0) ccw
  arc A215 (10.7234, 0.3663) -> (10.0412, 0.5721) centre (9.2662, -3.231) ccw
  arc A216 (10.0412, 0.5721) -> (10.0256, 0.8005) centre (0, 0) ccw
  arc A217 (10.0256, 0.8005) -> (10.6734, 1.0973) centre (8.7399, 4.4627) ccw
  arc A218 (10.6734, 1.0973) -> (10.6457, 1.3399) centre (0, 0) ccw
  arc A219 (10.6457, 1.3399) -> (9.9476, 1.4828) centre (9.5216, -2.375) ccw
  arc A220 (9.9476, 1.4828) -> (9.9113, 1.7089) centre (0, 0) ccw
  arc A221 (9.9113, 1.7089) -> (10.5294, 2.0633) centre (8.2979, 5.239) ccw
  arc A222 (10.5294, 2.0633) -> (10.4797, 2.3024) centre (0, 0) ccw
  arc A223 (10.4797, 2.3024) -> (9.7716, 2.3813) centre (9.6981, -1.4994) ccw
  arc A224 (9.7716, 2.3813) -> (9.7148, 2.6031) centre (0, 0) ccw
  arc A225 (9.7148, 2.6031) -> (10.2982, 3.0122) centre (7.7871, 5.9718) ccw
  arc A226 (10.2982, 3.0122) -> (10.2269, 3.2459) centre (0, 0) ccw
  arc A227 (10.2269, 3.2459) -> (9.5145, 3.26) centre (9.7943, -0.6112) ccw
  arc A228 (9.5145, 3.26) -> (9.4379, 3.4757) centre (0, 0) ccw
  arc A229 (9.4379, 3.4757) -> (9.9816, 3.9362) centre (7.2118, 6.6552) ccw
  arc A230 (9.9816, 3.9362) -> (9.8894, 4.1624) centre (0, 0) ccw
  arc A231 (9.8894, 4.1624) -> (9.1787, 4.1117) centre (9.8093, 0.2819) ccw
  arc A232 (9.1787, 4.1117) -> (9.0827, 4.3195) centre (0, 0) ccw
  arc A233 (9.0827, 4.3195) -> (9.5823, 4.8276) centre (6.5767, 7.2834) ccw
  arc A234 (9.5823, 4.8276) -> (9.4699, 5.0445) centre (0, 0) ccw
  arc A235 (9.4699, 5.0445) -> (8.7667, 4.9293) centre (9.743, 1.1728) ccw
  arc A236 (8.7667, 4.9293) -> (8.6523, 5.1276) centre (0, 0) ccw
  arc A237 (8.6523, 5.1276) -> (9.1036, 5.679) centre (5.8872, 7.8513) ccw
  arc A238 (9.1036, 5.679) -> (8.972, 5.8847) centre (0, 0) ccw
  arc A239 (8.972, 5.8847) -> (8.2822, 5.7061) centre (9.596, 2.0539) ccw
  arc A240 (8.2822, 5.7061) -> (8.1501, 5.8931) centre (0, 0) ccw
  arc A241 (8.1501, 5.8931) -> (8.5495, 6.4833) centre (5.1488, 8.3541) ccw
  arc A242 (8.5495, 6.4833) -> (8.3997, 6.6762) centre (0, 0) ccw
  arc A243 (8.3997, 6.6762) -> (7.729, 6.4356) centre (9.3695, 2.918) ccw
  arc A244 (7.729, 6.4356) -> (7.5805, 6.6098) centre (0, 0) ccw
  arc A245 (7.5805, 6.6098) -> (7.9245, 7.2338) centre (4.3678, 8.7877) ccw
  arc A246 (7.9245, 7.2338) -> (7.7578, 7.4124) centre (0, 0) ccw
  arc A247 (7.7578, 7.4124) -> (7.1117, 7.1117) centre (9.0653, 3.7579) ccw
  arc A248 (7.1117, 7.1117) -> (6.948, 7.2718) centre (0, 0) ccw
  arc A249 (6.948, 7.2718) -> (7.2338, 7.9245) centre (3.5506, 9.1485) ccw
  arc A250 (7.2338, 7.9245) -> (7.0516, 8.0871) centre (0, 0) ccw
  arc A251 (7.0516, 8.0871) -> (6.4356, 7.729) centre (8.686, 4.5667) ccw
  arc A252 (6.4356, 7.729) -> (6.258, 7.8735) centre (0, 0) ccw
  arc A253 (6.258, 7.8735) -> (6.4833, 8.5495) centre (2.704, 9.4335) ccw
  arc A254 (6.4833, 8.5495) -> (6.287, 8.6948) centre (0, 0) ccw
  arc A255 (6.287, 8.6948) -> (5.7061, 8.2822) centre (8.2348, 5.3376) ccw
  arc A256 (5.7061, 8.2822) -> (5.5161, 8.4099) centre (0, 0) ccw
  arc A257 (5.5161, 8.4099) -> (5.679, 9.1036) centre (1.8349, 9.6403) ccw
  arc A258 (5.679, 9.1036) -> (5.4703, 9.2305) centre (0, 0) ccw
  arc A259 (5.4703, 9.2305) -> (4.9293, 8.7667) centre (7.7153, 6.0644) ccw
  arc A260 (4.9293, 8.7667) -> (4.7285, 8.8767) centre (0, 0) ccw
  arc A261 (4.7285, 8.8767) -> (4.8276, 9.5823) centre (0.9507, 9.7672) ccw
  arc A262 (4.8276, 9.5823) -> (4.6082, 9.6897) centre (0, 0) ccw
  arc A263 (4.6082, 9.6897) -> (4.1117, 9.1787) centre (7.1318, 6.7408) ccw
  arc A264 (4.1117, 9.1787) -> (3.9017, 9.2699) centre (0, 0) ccw
  arc A265 (3.9017, 9.2699) -> (3.9362, 9.9816) centre (0.0586, 9.8132) ccw
  arc A266 (3.9362, 9.9816) -> (3.708, 10.0686) centre (0, 0) ccw
  arc A267 (3.708, 10.0686) -> (3.26, 9.5145) centre (6.4893, 7.3614) ccw
  arc A268 (3.26, 9.5145) -> (3.0425, 9.5863) centre (0, 0) ccw
  arc A269 (3.0425, 9.5863) -> (3.0122, 10.2982) centre (-0.834, 9.7778) ccw
  arc A270 (3.0122, 10.2982) -> (2.777, 10.3641) centre (0, 0) ccw
  arc A271 (2.777, 10.3641) -> (2.3813, 9.7716) centre (5.793, 7.921) ccw
  arc A272 (2.3813, 9.7716) -> (2.1582, 9.8232) centre (0, 0) ccw
  arc A273 (2.1582, 9.8232) -> (2.0633, 10.5294) centre (-1.7197, 9.6615) ccw
  arc A274 (2.0633, 10.5294) -> (1.8231, 10.5737) centre (0, 0) ccw
  arc A275 (1.8231, 10.5737) -> (1.4828, 9.9476) centre (5.0487, 8.415) ccw
  arc A276 (1.4828, 9.9476) -> (1.256, 9.9788) centre (0, 0) ccw
sketch "Sketch13" plane through (0, 0, 8.5) normal (0, 0, 1) x (1, 0, 0)
  line L0 (-2.8191, 1.0261) -> (-6.5104, 2.3696) projected
  arc A0 (-7.0496, 3.782) -> (-6.5104, 2.3696) centre (-6.1684, 3.3093) ccw projected
  arc A1 (-3.5337, 7.1773) -> (-7.0496, 3.782) centre (0, 0) ccw projected
  arc A2 (-2.1409, 6.5891) -> (-3.5337, 7.1773) centre (-3.092, 6.2801) ccw projected
  line L1 (-2.1409, 6.5891) -> (-0.9271, 2.8532) projected
  arc A3 (3.4802, -7.2034) -> (3.8742, -5.7437) centre (3.0452, -6.3029) ccw projected
  arc A4 (-1.3599, -7.8836) -> (3.4802, -7.2034) centre (0, 0) ccw projected
  arc A5 (-2.1409, -6.5891) -> (-1.3599, -7.8836) centre (-1.1899, -6.8981) ccw projected
  line L2 (-2.1409, -6.5891) -> (-0.9271, -2.8532) projected
  line L3 (1.6776, -2.4871) -> (3.8742, -5.7437) projected
  line L4 (-1.847, -2.364) -> (-4.2654, -5.4595) projected
  arc A6 (-5.7754, -5.5358) -> (-4.2654, -5.4595) centre (-5.0534, -4.8438) ccw projected
  arc A7 (-7.9179, -1.1429) -> (-5.7754, -5.5358) centre (0, 0) ccw projected
  arc A8 (-6.9282, 0) -> (-7.9179, -1.1429) centre (-6.9282, -1) ccw projected
  line L5 (-6.9282, 0) -> (-3, 0) projected
  line L6 (0.1047, 2.9982) -> (0.2418, 6.924) projected
  arc A9 (1.4185, 7.8732) -> (0.2418, 6.924) centre (1.2412, 6.8891) ccw projected
  arc A10 (5.734, 5.5786) -> (1.4185, 7.8732) centre (0, 0) ccw projected
  arc A11 (5.605, 4.0723) -> (5.734, 5.5786) centre (5.0172, 4.8813) ccw projected
  line L7 (5.605, 4.0723) -> (2.4271, 1.7634) projected
  line L8 (2.8838, 0.8269) -> (6.6598, 1.9097) projected
  arc A12 (7.9262, 1.0839) -> (6.6598, 1.9097) centre (6.9355, 0.9484) ccw projected
  arc A13 (7.0775, -3.7295) -> (7.9262, 1.0839) centre (0, 0) ccw projected
  arc A14 (5.605, -4.0723) -> (7.0775, -3.7295) centre (6.1928, -3.2633) ccw projected
  line L9 (5.605, -4.0723) -> (2.4271, -1.7634) projected
  circle A15 centre (0, 0) radius 1 projected
  circle A16 centre (0, 0) radius 10 projected
  arc A17 (-0.9271, 2.8532) -> (-2.8191, 1.0261) centre (0, 0) ccw projected
  arc A18 (-0.9271, -2.8532) -> (1.6776, -2.4871) centre (0, 0) ccw projected
  arc A19 (-3, 0) -> (-1.847, -2.364) centre (0, 0) ccw projected
  arc A20 (2.4271, 1.7634) -> (0.1047, 2.9982) centre (0, 0) ccw projected
  arc A21 (2.4271, -1.7634) -> (2.8838, 0.8269) centre (0, 0) ccw projected
sketch "Sketch14" plane through (0, 0, 8.5) normal (0, 0, 1) x (1, 0, 0)
  circle A0 centre (0, 0) radius 1.6
  dimension "d122" = 3.2
fillet "Fillet12" radius 1 10 edges at (-0.9271, -2.8532, 4.25) (2.8838, 0.8269, 4.25) (2.4271, -1.7634, 4.25) (0.1047, 2.9982, 4.25) (2.4271, 1.7634, 4.25) (-0.9271, 2.8532, 4.25) (-2.8191, 1.0261, 4.25) (-3, 0, 4.25) (-1.847, -2.364, 4.25) (1.6776, -2.4871, 4.25)
extrude "Extrusion13" cut sketch "Sketch14" against normal blind 10
properties part number "Rueda_Rin"
